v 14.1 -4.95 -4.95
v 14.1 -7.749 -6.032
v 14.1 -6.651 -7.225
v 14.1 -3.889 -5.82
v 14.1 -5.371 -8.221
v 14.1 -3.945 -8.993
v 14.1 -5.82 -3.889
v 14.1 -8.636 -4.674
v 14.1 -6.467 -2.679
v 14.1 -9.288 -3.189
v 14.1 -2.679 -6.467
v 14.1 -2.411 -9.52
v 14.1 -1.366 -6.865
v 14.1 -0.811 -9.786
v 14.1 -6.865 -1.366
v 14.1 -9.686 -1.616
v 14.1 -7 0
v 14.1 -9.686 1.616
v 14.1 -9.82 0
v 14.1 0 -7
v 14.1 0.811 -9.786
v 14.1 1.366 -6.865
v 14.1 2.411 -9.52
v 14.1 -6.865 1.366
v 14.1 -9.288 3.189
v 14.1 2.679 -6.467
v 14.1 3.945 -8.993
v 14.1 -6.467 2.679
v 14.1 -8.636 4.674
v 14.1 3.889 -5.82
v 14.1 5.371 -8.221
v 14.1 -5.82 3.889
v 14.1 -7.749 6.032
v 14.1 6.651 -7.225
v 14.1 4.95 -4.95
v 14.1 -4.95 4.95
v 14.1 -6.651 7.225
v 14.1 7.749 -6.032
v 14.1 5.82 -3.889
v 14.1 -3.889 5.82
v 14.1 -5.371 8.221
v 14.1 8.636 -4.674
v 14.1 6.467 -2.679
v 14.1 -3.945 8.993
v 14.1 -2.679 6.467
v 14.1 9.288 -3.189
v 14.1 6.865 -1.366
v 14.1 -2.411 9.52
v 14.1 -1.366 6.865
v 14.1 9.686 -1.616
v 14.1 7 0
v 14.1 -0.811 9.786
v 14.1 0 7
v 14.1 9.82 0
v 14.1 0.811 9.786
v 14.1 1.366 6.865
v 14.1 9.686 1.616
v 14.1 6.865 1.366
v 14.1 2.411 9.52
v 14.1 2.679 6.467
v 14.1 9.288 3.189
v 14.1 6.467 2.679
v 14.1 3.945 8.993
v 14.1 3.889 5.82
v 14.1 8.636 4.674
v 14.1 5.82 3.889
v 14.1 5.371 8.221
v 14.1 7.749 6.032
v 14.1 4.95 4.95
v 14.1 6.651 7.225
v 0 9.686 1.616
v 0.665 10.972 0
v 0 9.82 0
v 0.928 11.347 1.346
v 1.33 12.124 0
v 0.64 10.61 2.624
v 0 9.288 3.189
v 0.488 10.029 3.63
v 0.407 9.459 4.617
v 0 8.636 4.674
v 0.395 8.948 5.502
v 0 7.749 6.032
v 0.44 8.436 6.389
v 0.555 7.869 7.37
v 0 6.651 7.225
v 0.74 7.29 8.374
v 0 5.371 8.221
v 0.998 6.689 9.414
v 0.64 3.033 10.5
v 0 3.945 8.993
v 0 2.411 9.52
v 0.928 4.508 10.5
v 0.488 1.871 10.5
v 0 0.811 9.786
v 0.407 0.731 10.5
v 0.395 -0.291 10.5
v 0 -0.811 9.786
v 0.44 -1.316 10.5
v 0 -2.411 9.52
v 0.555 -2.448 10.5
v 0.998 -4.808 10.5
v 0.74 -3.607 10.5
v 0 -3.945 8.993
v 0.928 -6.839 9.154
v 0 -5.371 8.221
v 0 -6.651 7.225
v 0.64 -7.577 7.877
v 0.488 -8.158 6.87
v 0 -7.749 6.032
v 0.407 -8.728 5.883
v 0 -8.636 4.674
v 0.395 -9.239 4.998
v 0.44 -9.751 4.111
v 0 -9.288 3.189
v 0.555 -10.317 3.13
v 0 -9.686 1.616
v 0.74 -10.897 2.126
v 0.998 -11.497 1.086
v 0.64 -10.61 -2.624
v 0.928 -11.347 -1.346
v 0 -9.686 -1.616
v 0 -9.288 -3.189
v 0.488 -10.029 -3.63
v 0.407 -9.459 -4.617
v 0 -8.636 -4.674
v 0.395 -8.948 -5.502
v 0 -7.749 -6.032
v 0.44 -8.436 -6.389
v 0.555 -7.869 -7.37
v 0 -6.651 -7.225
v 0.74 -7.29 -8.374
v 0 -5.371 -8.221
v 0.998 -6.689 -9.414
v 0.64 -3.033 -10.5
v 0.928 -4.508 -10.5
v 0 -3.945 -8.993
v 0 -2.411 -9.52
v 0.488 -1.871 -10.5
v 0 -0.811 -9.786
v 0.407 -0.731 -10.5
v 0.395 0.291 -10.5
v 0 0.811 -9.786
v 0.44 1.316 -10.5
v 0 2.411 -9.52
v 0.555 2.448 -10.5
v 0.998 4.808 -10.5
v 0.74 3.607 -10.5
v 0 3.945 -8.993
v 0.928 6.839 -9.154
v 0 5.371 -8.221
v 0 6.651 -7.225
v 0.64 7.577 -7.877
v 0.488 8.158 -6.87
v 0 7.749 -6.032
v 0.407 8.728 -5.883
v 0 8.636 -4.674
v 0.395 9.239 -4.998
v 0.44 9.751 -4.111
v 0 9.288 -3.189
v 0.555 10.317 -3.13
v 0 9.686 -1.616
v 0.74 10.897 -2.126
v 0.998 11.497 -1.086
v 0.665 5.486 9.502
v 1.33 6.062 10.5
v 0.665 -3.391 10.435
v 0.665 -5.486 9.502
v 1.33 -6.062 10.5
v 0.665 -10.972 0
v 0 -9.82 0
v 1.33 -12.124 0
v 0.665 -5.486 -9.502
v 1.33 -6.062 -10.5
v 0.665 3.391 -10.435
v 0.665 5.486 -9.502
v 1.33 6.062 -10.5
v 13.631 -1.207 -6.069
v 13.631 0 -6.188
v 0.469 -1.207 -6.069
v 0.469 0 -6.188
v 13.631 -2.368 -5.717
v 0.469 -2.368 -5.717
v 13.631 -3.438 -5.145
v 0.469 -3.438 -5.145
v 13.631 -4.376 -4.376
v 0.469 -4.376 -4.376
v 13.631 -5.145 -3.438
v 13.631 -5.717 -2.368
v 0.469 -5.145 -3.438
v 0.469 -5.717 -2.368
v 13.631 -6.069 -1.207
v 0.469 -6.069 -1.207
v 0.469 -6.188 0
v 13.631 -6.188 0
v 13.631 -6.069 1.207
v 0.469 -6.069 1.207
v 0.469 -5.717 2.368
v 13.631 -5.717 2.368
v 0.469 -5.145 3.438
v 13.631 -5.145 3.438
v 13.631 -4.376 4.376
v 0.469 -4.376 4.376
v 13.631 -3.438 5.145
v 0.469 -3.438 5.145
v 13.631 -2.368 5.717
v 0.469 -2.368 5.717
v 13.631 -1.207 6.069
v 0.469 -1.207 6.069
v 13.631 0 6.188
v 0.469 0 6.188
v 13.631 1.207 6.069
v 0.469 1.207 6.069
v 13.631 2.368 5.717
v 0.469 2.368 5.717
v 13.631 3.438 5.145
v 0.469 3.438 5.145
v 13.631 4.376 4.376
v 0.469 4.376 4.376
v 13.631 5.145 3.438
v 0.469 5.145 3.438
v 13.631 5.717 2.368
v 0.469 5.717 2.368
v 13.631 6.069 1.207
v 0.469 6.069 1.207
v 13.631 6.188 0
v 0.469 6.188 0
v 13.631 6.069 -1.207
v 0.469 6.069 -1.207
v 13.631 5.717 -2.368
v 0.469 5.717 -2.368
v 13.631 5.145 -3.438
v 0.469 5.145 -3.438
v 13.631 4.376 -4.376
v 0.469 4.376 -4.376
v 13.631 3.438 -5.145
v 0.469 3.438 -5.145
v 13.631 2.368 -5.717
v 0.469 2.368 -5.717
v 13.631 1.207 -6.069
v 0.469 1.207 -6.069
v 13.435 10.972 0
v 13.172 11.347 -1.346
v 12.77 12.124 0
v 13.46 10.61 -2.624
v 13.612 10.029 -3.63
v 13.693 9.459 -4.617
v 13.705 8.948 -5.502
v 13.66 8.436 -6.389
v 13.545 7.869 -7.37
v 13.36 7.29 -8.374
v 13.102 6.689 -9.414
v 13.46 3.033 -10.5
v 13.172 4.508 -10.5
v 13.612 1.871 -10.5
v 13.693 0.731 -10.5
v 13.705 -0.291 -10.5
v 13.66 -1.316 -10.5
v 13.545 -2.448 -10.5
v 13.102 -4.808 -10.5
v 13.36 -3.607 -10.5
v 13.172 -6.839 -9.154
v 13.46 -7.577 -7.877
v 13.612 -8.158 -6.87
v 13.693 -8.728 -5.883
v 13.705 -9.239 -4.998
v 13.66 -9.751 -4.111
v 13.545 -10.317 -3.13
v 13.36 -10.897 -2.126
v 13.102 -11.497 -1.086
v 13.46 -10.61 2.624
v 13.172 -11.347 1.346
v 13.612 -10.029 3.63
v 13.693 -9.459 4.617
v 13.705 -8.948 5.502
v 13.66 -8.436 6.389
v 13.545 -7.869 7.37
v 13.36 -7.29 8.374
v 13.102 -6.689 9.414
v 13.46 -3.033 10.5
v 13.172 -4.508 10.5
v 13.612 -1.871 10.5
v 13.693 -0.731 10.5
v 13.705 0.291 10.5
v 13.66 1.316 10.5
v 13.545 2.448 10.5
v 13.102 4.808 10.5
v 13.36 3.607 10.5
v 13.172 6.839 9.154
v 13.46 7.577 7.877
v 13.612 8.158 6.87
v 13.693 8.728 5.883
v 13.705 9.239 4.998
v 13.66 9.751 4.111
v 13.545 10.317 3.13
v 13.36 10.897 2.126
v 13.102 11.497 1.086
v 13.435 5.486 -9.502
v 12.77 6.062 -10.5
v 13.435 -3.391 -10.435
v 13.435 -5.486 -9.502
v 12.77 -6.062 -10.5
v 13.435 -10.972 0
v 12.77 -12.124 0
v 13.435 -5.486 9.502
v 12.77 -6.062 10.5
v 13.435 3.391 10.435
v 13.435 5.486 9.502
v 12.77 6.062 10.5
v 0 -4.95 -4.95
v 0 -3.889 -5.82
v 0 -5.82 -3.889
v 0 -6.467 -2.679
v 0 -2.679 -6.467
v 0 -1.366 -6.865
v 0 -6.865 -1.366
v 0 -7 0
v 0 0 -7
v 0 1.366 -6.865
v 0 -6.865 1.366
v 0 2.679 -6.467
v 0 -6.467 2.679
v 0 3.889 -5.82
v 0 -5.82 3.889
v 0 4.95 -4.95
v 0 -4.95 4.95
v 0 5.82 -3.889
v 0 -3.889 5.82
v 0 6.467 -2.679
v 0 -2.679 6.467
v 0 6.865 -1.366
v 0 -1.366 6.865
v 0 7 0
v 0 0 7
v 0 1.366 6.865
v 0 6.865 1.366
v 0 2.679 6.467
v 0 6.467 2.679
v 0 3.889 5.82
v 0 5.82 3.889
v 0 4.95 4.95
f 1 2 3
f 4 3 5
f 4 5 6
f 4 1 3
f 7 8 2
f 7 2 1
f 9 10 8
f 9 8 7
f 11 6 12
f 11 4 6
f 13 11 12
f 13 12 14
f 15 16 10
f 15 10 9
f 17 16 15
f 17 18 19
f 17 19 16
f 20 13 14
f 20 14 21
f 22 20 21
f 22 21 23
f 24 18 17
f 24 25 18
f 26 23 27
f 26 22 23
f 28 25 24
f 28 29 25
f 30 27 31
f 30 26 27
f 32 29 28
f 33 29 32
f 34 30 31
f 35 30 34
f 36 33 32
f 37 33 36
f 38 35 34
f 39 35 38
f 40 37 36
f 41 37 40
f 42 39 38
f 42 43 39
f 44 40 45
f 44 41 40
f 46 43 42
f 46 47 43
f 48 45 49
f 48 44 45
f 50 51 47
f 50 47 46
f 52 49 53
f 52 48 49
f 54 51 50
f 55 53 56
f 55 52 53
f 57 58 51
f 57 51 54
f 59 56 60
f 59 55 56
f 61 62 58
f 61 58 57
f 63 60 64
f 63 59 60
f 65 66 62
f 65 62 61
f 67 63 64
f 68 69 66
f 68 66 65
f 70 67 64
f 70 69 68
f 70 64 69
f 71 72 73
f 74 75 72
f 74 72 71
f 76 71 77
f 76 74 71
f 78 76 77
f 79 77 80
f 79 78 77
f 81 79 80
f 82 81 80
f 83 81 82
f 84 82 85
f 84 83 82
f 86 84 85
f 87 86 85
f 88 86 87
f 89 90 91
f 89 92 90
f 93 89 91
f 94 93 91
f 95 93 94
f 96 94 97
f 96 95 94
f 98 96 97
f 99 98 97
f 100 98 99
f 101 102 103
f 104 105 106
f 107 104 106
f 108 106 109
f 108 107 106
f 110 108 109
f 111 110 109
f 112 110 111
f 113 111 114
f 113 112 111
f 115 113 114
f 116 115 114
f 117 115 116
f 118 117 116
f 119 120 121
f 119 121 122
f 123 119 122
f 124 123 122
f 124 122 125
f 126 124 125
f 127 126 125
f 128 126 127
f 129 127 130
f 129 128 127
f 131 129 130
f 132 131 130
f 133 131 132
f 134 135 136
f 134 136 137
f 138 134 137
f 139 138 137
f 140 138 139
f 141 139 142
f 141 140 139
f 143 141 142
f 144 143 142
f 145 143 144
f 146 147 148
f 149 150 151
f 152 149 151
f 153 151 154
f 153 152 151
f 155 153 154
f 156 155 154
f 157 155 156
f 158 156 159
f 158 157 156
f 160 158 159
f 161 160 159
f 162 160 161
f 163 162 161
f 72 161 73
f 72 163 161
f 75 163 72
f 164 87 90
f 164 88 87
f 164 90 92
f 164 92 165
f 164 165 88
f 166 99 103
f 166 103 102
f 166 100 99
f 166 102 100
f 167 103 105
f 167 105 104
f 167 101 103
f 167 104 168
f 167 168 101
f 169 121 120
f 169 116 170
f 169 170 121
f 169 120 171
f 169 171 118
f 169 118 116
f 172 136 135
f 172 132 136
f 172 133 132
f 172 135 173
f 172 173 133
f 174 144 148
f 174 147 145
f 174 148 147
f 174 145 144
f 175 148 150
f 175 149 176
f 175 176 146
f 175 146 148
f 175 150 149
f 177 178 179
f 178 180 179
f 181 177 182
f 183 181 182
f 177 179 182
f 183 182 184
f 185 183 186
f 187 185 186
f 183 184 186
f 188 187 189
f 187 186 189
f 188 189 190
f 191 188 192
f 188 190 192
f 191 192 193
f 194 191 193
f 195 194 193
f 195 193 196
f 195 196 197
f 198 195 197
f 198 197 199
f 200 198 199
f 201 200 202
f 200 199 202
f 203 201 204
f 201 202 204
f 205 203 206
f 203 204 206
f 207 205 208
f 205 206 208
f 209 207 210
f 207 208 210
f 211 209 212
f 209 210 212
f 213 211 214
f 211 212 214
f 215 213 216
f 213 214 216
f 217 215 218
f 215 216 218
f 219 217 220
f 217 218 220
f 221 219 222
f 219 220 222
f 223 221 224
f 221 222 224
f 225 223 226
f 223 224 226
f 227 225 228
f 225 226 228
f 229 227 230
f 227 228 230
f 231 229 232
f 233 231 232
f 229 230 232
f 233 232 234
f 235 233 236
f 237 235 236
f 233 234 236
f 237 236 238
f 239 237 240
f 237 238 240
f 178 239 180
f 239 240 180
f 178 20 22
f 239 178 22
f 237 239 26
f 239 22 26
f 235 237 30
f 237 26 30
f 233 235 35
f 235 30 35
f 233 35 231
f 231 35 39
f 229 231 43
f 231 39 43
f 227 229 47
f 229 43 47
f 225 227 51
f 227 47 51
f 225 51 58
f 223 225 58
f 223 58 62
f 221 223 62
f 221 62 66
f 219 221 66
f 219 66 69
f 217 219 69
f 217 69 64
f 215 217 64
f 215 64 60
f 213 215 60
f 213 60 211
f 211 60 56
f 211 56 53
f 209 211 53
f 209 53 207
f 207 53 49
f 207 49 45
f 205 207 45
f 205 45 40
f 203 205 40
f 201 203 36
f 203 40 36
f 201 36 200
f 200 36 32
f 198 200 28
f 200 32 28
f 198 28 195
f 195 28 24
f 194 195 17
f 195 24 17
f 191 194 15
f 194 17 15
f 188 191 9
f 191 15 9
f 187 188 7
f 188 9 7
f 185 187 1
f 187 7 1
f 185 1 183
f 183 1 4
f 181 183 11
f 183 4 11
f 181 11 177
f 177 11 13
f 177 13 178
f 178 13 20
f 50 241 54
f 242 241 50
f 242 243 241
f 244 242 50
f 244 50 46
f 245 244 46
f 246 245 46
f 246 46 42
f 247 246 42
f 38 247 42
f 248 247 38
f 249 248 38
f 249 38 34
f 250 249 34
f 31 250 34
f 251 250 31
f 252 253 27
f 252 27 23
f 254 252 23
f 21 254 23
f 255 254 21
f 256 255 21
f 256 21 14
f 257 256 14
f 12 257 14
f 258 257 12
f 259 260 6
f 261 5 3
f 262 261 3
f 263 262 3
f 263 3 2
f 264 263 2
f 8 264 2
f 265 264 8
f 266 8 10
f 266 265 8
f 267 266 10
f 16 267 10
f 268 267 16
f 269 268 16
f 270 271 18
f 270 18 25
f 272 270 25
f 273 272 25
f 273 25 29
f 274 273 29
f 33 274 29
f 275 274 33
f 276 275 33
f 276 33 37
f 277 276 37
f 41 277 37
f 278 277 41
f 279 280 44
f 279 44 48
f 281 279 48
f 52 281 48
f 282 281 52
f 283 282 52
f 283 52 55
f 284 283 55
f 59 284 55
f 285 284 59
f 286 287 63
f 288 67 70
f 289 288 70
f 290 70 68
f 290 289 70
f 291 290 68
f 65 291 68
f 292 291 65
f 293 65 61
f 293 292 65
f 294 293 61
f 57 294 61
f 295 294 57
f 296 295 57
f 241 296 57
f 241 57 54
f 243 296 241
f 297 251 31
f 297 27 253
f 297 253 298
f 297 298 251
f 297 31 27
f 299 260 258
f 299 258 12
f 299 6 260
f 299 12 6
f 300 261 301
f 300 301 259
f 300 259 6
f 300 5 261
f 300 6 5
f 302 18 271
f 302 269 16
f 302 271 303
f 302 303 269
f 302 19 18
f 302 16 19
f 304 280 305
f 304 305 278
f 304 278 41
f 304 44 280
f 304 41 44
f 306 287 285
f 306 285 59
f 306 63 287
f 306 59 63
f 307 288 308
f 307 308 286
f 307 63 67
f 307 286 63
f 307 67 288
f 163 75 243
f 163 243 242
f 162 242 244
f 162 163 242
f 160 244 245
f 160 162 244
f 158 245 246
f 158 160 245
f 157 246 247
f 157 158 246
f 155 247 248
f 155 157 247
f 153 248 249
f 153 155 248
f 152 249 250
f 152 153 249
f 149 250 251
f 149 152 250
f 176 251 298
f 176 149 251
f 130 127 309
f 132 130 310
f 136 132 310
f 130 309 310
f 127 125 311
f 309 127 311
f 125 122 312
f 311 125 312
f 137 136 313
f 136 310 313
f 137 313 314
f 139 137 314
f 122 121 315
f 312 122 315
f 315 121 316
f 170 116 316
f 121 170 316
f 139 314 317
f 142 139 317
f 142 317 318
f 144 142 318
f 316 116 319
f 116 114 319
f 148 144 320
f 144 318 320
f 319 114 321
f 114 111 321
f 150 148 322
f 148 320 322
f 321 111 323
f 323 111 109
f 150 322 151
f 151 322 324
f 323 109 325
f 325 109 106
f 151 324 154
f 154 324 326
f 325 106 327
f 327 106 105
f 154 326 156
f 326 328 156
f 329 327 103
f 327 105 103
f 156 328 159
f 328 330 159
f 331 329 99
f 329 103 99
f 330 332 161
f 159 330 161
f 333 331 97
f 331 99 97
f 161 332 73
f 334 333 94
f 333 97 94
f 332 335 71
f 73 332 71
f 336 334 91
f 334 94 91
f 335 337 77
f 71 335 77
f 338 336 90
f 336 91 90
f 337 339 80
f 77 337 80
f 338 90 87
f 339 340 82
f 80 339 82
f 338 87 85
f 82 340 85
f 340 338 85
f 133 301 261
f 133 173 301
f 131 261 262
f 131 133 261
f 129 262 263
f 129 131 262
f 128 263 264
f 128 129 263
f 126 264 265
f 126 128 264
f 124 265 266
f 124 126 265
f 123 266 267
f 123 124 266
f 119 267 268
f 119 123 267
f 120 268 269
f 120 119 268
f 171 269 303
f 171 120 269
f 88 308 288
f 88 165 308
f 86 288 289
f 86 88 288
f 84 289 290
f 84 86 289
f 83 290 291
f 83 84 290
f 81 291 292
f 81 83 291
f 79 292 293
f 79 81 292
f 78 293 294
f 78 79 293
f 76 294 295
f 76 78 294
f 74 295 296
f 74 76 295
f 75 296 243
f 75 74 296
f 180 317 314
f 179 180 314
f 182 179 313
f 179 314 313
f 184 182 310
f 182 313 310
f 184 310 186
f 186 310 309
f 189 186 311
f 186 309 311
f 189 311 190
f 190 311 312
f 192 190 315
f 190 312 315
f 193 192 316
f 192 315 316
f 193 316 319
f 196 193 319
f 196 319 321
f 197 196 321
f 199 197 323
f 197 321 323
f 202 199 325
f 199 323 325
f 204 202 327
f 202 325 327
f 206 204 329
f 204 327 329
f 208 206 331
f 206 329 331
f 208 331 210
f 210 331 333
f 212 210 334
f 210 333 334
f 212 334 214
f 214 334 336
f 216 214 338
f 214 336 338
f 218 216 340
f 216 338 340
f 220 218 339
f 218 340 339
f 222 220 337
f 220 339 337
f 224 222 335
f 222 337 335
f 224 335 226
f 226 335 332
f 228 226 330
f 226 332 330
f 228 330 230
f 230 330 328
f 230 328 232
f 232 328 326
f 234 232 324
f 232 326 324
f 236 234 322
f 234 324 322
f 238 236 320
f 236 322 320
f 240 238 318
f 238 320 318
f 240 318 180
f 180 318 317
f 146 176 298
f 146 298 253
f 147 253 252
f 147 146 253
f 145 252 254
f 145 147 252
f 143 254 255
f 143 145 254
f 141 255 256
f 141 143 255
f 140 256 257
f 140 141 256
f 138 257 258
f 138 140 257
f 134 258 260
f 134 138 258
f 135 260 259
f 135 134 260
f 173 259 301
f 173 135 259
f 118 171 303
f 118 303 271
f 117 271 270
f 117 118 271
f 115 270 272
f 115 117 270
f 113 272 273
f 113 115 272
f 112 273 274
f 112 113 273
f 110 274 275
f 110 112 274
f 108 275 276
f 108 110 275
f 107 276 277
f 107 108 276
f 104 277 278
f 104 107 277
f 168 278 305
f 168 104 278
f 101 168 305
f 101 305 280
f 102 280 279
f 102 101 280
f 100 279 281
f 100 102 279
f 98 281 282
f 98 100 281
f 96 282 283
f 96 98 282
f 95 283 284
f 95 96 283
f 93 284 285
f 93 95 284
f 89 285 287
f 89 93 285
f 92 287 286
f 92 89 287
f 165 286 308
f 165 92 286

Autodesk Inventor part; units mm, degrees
ref_plane "YZ Plane" through (0, 0, 0) normal (1, 0, 0) x (0, 1, 0)
ref_plane "XZ Plane" through (0, 0, 0) normal (0, 1, 0) x (-1, 0, 0)
sketch "Sketch1" plane through (0, 0, 0) normal (1, 0, 0) x (0, 1, 0)
  line L0 (-12.1244, 0) -> (-6.0622, 10.5)
  line L1 (-6.0622, 10.5) -> (6.0622, 10.5)
  line L2 (6.0622, 10.5) -> (12.1244, 0)
  line L3 (12.1244, 0) -> (6.0622, -10.5)
  line L4 (6.0622, -10.5) -> (-6.0622, -10.5)
  line L5 (-6.0622, -10.5) -> (-12.1244, 0)
  point P0 (0, 0)
  point P1 (0, 0)
  dimension "d0" = 24.2487
extrude "Body" add sketch "Sketch1" along normal blind 14.1
sketch "Sketch2" plane through (0, 0, 0) normal (0, 0, 1) x (1, 0, 0)
  line L0 (0, 6.0622) -> (0, 12.1244) projected
  line L1 (0, 12.1244) -> (14.1, 12.1244) projected
  line L2 (14.1, 6.0622) -> (14.1, 12.1244) projected
  line L3 (-2.82, 0) -> (16.92, 0) projected
  line L4 (1.3304, 12.1244) -> (0, 9.82)
  line L5 (12.7696, 12.1244) -> (14.1, 9.82)
  dimension "d3" = 30
  dimension "d4" = 30
  dimension "d5" = 19.64
  dimension "d6" = 19.64
revolve "Chamfer1" cut sketch "Sketch2" angle 360 about axis through (-10, 0, 0) along (1, 0, 0)
sketch "Sketch3" plane through (14.1, 0, 0) normal (1, 0, 0) x (0, 0, -1)
  arc A0 (-0.625, -1.0825) -> (0.625, -1.0825) centre (0, 0) ccw projected
hole "Thread" at (14.1, 0, 0) direction (-1, 0, 0) diameter 12.376 end through all thread size "M14x1.5" class "6H" standard "ISO Metric profile"
chamfer "Chamfer2" distance 0.8119 angle 30 1 edges at (14.1, 0, 6.188) measured on face at (14.1, 8.4992, -1.032)
chamfer "Chamfer3" distance 0.8119 angle 30 1 edges at (0, 0, 6.188) measured on face at (0, 8.4992, -1.032)
ref_plane "Work Plane1" through (-21.2861, 0, 0) normal (0, -0.866, -0.5) x (1, 0, 0)
equation "\"d0\" = 1.1547 * SW"
equation "\"d1\" = KOH"
equation "\"d3\" = ANG1"
equation "\"d4\" = ANG2"
equation "\"d5\" = SW0"
equation "\"d6\" = SW01"
equation "\"d8\" = -0.5 * GD1 + 0.5 * NND"
equation "\"d40\" = -0.5 * GD1 + 0.5 * NND"
equation "\"d10\" = -0.5 * GD1 + 0.5 * NND"
equation "\"d41\" = -0.5 * GD1 + 0.5 * NND"
equation "\"ANG1\" = 30deg"
equation "\"ANG2\" = 30deg"
equation "\"NND\" = 14"
equation "\"KOH\" = 14.1"
equation "\"SW\" = 21"
equation "\"SW0\" = 19.64"
equation "\"SW01\" = SW0"
equation "\"GUL\" = 0.541266 * PTC"
equation "\"THREADDIA\" = 14"
equation "\"TOA\" = 30deg"
equation "\"PTC\" = 1.5"
equation "\"E0\" = 23.36"
equation "\"GAL\" = 0.541266 * PTC"
equation "\"KOH1\" = 10.72"
equation "\"GD1\" = 12.376202"
properties part number "ISO 8674 - M14 x 1.5" material "Steel"
